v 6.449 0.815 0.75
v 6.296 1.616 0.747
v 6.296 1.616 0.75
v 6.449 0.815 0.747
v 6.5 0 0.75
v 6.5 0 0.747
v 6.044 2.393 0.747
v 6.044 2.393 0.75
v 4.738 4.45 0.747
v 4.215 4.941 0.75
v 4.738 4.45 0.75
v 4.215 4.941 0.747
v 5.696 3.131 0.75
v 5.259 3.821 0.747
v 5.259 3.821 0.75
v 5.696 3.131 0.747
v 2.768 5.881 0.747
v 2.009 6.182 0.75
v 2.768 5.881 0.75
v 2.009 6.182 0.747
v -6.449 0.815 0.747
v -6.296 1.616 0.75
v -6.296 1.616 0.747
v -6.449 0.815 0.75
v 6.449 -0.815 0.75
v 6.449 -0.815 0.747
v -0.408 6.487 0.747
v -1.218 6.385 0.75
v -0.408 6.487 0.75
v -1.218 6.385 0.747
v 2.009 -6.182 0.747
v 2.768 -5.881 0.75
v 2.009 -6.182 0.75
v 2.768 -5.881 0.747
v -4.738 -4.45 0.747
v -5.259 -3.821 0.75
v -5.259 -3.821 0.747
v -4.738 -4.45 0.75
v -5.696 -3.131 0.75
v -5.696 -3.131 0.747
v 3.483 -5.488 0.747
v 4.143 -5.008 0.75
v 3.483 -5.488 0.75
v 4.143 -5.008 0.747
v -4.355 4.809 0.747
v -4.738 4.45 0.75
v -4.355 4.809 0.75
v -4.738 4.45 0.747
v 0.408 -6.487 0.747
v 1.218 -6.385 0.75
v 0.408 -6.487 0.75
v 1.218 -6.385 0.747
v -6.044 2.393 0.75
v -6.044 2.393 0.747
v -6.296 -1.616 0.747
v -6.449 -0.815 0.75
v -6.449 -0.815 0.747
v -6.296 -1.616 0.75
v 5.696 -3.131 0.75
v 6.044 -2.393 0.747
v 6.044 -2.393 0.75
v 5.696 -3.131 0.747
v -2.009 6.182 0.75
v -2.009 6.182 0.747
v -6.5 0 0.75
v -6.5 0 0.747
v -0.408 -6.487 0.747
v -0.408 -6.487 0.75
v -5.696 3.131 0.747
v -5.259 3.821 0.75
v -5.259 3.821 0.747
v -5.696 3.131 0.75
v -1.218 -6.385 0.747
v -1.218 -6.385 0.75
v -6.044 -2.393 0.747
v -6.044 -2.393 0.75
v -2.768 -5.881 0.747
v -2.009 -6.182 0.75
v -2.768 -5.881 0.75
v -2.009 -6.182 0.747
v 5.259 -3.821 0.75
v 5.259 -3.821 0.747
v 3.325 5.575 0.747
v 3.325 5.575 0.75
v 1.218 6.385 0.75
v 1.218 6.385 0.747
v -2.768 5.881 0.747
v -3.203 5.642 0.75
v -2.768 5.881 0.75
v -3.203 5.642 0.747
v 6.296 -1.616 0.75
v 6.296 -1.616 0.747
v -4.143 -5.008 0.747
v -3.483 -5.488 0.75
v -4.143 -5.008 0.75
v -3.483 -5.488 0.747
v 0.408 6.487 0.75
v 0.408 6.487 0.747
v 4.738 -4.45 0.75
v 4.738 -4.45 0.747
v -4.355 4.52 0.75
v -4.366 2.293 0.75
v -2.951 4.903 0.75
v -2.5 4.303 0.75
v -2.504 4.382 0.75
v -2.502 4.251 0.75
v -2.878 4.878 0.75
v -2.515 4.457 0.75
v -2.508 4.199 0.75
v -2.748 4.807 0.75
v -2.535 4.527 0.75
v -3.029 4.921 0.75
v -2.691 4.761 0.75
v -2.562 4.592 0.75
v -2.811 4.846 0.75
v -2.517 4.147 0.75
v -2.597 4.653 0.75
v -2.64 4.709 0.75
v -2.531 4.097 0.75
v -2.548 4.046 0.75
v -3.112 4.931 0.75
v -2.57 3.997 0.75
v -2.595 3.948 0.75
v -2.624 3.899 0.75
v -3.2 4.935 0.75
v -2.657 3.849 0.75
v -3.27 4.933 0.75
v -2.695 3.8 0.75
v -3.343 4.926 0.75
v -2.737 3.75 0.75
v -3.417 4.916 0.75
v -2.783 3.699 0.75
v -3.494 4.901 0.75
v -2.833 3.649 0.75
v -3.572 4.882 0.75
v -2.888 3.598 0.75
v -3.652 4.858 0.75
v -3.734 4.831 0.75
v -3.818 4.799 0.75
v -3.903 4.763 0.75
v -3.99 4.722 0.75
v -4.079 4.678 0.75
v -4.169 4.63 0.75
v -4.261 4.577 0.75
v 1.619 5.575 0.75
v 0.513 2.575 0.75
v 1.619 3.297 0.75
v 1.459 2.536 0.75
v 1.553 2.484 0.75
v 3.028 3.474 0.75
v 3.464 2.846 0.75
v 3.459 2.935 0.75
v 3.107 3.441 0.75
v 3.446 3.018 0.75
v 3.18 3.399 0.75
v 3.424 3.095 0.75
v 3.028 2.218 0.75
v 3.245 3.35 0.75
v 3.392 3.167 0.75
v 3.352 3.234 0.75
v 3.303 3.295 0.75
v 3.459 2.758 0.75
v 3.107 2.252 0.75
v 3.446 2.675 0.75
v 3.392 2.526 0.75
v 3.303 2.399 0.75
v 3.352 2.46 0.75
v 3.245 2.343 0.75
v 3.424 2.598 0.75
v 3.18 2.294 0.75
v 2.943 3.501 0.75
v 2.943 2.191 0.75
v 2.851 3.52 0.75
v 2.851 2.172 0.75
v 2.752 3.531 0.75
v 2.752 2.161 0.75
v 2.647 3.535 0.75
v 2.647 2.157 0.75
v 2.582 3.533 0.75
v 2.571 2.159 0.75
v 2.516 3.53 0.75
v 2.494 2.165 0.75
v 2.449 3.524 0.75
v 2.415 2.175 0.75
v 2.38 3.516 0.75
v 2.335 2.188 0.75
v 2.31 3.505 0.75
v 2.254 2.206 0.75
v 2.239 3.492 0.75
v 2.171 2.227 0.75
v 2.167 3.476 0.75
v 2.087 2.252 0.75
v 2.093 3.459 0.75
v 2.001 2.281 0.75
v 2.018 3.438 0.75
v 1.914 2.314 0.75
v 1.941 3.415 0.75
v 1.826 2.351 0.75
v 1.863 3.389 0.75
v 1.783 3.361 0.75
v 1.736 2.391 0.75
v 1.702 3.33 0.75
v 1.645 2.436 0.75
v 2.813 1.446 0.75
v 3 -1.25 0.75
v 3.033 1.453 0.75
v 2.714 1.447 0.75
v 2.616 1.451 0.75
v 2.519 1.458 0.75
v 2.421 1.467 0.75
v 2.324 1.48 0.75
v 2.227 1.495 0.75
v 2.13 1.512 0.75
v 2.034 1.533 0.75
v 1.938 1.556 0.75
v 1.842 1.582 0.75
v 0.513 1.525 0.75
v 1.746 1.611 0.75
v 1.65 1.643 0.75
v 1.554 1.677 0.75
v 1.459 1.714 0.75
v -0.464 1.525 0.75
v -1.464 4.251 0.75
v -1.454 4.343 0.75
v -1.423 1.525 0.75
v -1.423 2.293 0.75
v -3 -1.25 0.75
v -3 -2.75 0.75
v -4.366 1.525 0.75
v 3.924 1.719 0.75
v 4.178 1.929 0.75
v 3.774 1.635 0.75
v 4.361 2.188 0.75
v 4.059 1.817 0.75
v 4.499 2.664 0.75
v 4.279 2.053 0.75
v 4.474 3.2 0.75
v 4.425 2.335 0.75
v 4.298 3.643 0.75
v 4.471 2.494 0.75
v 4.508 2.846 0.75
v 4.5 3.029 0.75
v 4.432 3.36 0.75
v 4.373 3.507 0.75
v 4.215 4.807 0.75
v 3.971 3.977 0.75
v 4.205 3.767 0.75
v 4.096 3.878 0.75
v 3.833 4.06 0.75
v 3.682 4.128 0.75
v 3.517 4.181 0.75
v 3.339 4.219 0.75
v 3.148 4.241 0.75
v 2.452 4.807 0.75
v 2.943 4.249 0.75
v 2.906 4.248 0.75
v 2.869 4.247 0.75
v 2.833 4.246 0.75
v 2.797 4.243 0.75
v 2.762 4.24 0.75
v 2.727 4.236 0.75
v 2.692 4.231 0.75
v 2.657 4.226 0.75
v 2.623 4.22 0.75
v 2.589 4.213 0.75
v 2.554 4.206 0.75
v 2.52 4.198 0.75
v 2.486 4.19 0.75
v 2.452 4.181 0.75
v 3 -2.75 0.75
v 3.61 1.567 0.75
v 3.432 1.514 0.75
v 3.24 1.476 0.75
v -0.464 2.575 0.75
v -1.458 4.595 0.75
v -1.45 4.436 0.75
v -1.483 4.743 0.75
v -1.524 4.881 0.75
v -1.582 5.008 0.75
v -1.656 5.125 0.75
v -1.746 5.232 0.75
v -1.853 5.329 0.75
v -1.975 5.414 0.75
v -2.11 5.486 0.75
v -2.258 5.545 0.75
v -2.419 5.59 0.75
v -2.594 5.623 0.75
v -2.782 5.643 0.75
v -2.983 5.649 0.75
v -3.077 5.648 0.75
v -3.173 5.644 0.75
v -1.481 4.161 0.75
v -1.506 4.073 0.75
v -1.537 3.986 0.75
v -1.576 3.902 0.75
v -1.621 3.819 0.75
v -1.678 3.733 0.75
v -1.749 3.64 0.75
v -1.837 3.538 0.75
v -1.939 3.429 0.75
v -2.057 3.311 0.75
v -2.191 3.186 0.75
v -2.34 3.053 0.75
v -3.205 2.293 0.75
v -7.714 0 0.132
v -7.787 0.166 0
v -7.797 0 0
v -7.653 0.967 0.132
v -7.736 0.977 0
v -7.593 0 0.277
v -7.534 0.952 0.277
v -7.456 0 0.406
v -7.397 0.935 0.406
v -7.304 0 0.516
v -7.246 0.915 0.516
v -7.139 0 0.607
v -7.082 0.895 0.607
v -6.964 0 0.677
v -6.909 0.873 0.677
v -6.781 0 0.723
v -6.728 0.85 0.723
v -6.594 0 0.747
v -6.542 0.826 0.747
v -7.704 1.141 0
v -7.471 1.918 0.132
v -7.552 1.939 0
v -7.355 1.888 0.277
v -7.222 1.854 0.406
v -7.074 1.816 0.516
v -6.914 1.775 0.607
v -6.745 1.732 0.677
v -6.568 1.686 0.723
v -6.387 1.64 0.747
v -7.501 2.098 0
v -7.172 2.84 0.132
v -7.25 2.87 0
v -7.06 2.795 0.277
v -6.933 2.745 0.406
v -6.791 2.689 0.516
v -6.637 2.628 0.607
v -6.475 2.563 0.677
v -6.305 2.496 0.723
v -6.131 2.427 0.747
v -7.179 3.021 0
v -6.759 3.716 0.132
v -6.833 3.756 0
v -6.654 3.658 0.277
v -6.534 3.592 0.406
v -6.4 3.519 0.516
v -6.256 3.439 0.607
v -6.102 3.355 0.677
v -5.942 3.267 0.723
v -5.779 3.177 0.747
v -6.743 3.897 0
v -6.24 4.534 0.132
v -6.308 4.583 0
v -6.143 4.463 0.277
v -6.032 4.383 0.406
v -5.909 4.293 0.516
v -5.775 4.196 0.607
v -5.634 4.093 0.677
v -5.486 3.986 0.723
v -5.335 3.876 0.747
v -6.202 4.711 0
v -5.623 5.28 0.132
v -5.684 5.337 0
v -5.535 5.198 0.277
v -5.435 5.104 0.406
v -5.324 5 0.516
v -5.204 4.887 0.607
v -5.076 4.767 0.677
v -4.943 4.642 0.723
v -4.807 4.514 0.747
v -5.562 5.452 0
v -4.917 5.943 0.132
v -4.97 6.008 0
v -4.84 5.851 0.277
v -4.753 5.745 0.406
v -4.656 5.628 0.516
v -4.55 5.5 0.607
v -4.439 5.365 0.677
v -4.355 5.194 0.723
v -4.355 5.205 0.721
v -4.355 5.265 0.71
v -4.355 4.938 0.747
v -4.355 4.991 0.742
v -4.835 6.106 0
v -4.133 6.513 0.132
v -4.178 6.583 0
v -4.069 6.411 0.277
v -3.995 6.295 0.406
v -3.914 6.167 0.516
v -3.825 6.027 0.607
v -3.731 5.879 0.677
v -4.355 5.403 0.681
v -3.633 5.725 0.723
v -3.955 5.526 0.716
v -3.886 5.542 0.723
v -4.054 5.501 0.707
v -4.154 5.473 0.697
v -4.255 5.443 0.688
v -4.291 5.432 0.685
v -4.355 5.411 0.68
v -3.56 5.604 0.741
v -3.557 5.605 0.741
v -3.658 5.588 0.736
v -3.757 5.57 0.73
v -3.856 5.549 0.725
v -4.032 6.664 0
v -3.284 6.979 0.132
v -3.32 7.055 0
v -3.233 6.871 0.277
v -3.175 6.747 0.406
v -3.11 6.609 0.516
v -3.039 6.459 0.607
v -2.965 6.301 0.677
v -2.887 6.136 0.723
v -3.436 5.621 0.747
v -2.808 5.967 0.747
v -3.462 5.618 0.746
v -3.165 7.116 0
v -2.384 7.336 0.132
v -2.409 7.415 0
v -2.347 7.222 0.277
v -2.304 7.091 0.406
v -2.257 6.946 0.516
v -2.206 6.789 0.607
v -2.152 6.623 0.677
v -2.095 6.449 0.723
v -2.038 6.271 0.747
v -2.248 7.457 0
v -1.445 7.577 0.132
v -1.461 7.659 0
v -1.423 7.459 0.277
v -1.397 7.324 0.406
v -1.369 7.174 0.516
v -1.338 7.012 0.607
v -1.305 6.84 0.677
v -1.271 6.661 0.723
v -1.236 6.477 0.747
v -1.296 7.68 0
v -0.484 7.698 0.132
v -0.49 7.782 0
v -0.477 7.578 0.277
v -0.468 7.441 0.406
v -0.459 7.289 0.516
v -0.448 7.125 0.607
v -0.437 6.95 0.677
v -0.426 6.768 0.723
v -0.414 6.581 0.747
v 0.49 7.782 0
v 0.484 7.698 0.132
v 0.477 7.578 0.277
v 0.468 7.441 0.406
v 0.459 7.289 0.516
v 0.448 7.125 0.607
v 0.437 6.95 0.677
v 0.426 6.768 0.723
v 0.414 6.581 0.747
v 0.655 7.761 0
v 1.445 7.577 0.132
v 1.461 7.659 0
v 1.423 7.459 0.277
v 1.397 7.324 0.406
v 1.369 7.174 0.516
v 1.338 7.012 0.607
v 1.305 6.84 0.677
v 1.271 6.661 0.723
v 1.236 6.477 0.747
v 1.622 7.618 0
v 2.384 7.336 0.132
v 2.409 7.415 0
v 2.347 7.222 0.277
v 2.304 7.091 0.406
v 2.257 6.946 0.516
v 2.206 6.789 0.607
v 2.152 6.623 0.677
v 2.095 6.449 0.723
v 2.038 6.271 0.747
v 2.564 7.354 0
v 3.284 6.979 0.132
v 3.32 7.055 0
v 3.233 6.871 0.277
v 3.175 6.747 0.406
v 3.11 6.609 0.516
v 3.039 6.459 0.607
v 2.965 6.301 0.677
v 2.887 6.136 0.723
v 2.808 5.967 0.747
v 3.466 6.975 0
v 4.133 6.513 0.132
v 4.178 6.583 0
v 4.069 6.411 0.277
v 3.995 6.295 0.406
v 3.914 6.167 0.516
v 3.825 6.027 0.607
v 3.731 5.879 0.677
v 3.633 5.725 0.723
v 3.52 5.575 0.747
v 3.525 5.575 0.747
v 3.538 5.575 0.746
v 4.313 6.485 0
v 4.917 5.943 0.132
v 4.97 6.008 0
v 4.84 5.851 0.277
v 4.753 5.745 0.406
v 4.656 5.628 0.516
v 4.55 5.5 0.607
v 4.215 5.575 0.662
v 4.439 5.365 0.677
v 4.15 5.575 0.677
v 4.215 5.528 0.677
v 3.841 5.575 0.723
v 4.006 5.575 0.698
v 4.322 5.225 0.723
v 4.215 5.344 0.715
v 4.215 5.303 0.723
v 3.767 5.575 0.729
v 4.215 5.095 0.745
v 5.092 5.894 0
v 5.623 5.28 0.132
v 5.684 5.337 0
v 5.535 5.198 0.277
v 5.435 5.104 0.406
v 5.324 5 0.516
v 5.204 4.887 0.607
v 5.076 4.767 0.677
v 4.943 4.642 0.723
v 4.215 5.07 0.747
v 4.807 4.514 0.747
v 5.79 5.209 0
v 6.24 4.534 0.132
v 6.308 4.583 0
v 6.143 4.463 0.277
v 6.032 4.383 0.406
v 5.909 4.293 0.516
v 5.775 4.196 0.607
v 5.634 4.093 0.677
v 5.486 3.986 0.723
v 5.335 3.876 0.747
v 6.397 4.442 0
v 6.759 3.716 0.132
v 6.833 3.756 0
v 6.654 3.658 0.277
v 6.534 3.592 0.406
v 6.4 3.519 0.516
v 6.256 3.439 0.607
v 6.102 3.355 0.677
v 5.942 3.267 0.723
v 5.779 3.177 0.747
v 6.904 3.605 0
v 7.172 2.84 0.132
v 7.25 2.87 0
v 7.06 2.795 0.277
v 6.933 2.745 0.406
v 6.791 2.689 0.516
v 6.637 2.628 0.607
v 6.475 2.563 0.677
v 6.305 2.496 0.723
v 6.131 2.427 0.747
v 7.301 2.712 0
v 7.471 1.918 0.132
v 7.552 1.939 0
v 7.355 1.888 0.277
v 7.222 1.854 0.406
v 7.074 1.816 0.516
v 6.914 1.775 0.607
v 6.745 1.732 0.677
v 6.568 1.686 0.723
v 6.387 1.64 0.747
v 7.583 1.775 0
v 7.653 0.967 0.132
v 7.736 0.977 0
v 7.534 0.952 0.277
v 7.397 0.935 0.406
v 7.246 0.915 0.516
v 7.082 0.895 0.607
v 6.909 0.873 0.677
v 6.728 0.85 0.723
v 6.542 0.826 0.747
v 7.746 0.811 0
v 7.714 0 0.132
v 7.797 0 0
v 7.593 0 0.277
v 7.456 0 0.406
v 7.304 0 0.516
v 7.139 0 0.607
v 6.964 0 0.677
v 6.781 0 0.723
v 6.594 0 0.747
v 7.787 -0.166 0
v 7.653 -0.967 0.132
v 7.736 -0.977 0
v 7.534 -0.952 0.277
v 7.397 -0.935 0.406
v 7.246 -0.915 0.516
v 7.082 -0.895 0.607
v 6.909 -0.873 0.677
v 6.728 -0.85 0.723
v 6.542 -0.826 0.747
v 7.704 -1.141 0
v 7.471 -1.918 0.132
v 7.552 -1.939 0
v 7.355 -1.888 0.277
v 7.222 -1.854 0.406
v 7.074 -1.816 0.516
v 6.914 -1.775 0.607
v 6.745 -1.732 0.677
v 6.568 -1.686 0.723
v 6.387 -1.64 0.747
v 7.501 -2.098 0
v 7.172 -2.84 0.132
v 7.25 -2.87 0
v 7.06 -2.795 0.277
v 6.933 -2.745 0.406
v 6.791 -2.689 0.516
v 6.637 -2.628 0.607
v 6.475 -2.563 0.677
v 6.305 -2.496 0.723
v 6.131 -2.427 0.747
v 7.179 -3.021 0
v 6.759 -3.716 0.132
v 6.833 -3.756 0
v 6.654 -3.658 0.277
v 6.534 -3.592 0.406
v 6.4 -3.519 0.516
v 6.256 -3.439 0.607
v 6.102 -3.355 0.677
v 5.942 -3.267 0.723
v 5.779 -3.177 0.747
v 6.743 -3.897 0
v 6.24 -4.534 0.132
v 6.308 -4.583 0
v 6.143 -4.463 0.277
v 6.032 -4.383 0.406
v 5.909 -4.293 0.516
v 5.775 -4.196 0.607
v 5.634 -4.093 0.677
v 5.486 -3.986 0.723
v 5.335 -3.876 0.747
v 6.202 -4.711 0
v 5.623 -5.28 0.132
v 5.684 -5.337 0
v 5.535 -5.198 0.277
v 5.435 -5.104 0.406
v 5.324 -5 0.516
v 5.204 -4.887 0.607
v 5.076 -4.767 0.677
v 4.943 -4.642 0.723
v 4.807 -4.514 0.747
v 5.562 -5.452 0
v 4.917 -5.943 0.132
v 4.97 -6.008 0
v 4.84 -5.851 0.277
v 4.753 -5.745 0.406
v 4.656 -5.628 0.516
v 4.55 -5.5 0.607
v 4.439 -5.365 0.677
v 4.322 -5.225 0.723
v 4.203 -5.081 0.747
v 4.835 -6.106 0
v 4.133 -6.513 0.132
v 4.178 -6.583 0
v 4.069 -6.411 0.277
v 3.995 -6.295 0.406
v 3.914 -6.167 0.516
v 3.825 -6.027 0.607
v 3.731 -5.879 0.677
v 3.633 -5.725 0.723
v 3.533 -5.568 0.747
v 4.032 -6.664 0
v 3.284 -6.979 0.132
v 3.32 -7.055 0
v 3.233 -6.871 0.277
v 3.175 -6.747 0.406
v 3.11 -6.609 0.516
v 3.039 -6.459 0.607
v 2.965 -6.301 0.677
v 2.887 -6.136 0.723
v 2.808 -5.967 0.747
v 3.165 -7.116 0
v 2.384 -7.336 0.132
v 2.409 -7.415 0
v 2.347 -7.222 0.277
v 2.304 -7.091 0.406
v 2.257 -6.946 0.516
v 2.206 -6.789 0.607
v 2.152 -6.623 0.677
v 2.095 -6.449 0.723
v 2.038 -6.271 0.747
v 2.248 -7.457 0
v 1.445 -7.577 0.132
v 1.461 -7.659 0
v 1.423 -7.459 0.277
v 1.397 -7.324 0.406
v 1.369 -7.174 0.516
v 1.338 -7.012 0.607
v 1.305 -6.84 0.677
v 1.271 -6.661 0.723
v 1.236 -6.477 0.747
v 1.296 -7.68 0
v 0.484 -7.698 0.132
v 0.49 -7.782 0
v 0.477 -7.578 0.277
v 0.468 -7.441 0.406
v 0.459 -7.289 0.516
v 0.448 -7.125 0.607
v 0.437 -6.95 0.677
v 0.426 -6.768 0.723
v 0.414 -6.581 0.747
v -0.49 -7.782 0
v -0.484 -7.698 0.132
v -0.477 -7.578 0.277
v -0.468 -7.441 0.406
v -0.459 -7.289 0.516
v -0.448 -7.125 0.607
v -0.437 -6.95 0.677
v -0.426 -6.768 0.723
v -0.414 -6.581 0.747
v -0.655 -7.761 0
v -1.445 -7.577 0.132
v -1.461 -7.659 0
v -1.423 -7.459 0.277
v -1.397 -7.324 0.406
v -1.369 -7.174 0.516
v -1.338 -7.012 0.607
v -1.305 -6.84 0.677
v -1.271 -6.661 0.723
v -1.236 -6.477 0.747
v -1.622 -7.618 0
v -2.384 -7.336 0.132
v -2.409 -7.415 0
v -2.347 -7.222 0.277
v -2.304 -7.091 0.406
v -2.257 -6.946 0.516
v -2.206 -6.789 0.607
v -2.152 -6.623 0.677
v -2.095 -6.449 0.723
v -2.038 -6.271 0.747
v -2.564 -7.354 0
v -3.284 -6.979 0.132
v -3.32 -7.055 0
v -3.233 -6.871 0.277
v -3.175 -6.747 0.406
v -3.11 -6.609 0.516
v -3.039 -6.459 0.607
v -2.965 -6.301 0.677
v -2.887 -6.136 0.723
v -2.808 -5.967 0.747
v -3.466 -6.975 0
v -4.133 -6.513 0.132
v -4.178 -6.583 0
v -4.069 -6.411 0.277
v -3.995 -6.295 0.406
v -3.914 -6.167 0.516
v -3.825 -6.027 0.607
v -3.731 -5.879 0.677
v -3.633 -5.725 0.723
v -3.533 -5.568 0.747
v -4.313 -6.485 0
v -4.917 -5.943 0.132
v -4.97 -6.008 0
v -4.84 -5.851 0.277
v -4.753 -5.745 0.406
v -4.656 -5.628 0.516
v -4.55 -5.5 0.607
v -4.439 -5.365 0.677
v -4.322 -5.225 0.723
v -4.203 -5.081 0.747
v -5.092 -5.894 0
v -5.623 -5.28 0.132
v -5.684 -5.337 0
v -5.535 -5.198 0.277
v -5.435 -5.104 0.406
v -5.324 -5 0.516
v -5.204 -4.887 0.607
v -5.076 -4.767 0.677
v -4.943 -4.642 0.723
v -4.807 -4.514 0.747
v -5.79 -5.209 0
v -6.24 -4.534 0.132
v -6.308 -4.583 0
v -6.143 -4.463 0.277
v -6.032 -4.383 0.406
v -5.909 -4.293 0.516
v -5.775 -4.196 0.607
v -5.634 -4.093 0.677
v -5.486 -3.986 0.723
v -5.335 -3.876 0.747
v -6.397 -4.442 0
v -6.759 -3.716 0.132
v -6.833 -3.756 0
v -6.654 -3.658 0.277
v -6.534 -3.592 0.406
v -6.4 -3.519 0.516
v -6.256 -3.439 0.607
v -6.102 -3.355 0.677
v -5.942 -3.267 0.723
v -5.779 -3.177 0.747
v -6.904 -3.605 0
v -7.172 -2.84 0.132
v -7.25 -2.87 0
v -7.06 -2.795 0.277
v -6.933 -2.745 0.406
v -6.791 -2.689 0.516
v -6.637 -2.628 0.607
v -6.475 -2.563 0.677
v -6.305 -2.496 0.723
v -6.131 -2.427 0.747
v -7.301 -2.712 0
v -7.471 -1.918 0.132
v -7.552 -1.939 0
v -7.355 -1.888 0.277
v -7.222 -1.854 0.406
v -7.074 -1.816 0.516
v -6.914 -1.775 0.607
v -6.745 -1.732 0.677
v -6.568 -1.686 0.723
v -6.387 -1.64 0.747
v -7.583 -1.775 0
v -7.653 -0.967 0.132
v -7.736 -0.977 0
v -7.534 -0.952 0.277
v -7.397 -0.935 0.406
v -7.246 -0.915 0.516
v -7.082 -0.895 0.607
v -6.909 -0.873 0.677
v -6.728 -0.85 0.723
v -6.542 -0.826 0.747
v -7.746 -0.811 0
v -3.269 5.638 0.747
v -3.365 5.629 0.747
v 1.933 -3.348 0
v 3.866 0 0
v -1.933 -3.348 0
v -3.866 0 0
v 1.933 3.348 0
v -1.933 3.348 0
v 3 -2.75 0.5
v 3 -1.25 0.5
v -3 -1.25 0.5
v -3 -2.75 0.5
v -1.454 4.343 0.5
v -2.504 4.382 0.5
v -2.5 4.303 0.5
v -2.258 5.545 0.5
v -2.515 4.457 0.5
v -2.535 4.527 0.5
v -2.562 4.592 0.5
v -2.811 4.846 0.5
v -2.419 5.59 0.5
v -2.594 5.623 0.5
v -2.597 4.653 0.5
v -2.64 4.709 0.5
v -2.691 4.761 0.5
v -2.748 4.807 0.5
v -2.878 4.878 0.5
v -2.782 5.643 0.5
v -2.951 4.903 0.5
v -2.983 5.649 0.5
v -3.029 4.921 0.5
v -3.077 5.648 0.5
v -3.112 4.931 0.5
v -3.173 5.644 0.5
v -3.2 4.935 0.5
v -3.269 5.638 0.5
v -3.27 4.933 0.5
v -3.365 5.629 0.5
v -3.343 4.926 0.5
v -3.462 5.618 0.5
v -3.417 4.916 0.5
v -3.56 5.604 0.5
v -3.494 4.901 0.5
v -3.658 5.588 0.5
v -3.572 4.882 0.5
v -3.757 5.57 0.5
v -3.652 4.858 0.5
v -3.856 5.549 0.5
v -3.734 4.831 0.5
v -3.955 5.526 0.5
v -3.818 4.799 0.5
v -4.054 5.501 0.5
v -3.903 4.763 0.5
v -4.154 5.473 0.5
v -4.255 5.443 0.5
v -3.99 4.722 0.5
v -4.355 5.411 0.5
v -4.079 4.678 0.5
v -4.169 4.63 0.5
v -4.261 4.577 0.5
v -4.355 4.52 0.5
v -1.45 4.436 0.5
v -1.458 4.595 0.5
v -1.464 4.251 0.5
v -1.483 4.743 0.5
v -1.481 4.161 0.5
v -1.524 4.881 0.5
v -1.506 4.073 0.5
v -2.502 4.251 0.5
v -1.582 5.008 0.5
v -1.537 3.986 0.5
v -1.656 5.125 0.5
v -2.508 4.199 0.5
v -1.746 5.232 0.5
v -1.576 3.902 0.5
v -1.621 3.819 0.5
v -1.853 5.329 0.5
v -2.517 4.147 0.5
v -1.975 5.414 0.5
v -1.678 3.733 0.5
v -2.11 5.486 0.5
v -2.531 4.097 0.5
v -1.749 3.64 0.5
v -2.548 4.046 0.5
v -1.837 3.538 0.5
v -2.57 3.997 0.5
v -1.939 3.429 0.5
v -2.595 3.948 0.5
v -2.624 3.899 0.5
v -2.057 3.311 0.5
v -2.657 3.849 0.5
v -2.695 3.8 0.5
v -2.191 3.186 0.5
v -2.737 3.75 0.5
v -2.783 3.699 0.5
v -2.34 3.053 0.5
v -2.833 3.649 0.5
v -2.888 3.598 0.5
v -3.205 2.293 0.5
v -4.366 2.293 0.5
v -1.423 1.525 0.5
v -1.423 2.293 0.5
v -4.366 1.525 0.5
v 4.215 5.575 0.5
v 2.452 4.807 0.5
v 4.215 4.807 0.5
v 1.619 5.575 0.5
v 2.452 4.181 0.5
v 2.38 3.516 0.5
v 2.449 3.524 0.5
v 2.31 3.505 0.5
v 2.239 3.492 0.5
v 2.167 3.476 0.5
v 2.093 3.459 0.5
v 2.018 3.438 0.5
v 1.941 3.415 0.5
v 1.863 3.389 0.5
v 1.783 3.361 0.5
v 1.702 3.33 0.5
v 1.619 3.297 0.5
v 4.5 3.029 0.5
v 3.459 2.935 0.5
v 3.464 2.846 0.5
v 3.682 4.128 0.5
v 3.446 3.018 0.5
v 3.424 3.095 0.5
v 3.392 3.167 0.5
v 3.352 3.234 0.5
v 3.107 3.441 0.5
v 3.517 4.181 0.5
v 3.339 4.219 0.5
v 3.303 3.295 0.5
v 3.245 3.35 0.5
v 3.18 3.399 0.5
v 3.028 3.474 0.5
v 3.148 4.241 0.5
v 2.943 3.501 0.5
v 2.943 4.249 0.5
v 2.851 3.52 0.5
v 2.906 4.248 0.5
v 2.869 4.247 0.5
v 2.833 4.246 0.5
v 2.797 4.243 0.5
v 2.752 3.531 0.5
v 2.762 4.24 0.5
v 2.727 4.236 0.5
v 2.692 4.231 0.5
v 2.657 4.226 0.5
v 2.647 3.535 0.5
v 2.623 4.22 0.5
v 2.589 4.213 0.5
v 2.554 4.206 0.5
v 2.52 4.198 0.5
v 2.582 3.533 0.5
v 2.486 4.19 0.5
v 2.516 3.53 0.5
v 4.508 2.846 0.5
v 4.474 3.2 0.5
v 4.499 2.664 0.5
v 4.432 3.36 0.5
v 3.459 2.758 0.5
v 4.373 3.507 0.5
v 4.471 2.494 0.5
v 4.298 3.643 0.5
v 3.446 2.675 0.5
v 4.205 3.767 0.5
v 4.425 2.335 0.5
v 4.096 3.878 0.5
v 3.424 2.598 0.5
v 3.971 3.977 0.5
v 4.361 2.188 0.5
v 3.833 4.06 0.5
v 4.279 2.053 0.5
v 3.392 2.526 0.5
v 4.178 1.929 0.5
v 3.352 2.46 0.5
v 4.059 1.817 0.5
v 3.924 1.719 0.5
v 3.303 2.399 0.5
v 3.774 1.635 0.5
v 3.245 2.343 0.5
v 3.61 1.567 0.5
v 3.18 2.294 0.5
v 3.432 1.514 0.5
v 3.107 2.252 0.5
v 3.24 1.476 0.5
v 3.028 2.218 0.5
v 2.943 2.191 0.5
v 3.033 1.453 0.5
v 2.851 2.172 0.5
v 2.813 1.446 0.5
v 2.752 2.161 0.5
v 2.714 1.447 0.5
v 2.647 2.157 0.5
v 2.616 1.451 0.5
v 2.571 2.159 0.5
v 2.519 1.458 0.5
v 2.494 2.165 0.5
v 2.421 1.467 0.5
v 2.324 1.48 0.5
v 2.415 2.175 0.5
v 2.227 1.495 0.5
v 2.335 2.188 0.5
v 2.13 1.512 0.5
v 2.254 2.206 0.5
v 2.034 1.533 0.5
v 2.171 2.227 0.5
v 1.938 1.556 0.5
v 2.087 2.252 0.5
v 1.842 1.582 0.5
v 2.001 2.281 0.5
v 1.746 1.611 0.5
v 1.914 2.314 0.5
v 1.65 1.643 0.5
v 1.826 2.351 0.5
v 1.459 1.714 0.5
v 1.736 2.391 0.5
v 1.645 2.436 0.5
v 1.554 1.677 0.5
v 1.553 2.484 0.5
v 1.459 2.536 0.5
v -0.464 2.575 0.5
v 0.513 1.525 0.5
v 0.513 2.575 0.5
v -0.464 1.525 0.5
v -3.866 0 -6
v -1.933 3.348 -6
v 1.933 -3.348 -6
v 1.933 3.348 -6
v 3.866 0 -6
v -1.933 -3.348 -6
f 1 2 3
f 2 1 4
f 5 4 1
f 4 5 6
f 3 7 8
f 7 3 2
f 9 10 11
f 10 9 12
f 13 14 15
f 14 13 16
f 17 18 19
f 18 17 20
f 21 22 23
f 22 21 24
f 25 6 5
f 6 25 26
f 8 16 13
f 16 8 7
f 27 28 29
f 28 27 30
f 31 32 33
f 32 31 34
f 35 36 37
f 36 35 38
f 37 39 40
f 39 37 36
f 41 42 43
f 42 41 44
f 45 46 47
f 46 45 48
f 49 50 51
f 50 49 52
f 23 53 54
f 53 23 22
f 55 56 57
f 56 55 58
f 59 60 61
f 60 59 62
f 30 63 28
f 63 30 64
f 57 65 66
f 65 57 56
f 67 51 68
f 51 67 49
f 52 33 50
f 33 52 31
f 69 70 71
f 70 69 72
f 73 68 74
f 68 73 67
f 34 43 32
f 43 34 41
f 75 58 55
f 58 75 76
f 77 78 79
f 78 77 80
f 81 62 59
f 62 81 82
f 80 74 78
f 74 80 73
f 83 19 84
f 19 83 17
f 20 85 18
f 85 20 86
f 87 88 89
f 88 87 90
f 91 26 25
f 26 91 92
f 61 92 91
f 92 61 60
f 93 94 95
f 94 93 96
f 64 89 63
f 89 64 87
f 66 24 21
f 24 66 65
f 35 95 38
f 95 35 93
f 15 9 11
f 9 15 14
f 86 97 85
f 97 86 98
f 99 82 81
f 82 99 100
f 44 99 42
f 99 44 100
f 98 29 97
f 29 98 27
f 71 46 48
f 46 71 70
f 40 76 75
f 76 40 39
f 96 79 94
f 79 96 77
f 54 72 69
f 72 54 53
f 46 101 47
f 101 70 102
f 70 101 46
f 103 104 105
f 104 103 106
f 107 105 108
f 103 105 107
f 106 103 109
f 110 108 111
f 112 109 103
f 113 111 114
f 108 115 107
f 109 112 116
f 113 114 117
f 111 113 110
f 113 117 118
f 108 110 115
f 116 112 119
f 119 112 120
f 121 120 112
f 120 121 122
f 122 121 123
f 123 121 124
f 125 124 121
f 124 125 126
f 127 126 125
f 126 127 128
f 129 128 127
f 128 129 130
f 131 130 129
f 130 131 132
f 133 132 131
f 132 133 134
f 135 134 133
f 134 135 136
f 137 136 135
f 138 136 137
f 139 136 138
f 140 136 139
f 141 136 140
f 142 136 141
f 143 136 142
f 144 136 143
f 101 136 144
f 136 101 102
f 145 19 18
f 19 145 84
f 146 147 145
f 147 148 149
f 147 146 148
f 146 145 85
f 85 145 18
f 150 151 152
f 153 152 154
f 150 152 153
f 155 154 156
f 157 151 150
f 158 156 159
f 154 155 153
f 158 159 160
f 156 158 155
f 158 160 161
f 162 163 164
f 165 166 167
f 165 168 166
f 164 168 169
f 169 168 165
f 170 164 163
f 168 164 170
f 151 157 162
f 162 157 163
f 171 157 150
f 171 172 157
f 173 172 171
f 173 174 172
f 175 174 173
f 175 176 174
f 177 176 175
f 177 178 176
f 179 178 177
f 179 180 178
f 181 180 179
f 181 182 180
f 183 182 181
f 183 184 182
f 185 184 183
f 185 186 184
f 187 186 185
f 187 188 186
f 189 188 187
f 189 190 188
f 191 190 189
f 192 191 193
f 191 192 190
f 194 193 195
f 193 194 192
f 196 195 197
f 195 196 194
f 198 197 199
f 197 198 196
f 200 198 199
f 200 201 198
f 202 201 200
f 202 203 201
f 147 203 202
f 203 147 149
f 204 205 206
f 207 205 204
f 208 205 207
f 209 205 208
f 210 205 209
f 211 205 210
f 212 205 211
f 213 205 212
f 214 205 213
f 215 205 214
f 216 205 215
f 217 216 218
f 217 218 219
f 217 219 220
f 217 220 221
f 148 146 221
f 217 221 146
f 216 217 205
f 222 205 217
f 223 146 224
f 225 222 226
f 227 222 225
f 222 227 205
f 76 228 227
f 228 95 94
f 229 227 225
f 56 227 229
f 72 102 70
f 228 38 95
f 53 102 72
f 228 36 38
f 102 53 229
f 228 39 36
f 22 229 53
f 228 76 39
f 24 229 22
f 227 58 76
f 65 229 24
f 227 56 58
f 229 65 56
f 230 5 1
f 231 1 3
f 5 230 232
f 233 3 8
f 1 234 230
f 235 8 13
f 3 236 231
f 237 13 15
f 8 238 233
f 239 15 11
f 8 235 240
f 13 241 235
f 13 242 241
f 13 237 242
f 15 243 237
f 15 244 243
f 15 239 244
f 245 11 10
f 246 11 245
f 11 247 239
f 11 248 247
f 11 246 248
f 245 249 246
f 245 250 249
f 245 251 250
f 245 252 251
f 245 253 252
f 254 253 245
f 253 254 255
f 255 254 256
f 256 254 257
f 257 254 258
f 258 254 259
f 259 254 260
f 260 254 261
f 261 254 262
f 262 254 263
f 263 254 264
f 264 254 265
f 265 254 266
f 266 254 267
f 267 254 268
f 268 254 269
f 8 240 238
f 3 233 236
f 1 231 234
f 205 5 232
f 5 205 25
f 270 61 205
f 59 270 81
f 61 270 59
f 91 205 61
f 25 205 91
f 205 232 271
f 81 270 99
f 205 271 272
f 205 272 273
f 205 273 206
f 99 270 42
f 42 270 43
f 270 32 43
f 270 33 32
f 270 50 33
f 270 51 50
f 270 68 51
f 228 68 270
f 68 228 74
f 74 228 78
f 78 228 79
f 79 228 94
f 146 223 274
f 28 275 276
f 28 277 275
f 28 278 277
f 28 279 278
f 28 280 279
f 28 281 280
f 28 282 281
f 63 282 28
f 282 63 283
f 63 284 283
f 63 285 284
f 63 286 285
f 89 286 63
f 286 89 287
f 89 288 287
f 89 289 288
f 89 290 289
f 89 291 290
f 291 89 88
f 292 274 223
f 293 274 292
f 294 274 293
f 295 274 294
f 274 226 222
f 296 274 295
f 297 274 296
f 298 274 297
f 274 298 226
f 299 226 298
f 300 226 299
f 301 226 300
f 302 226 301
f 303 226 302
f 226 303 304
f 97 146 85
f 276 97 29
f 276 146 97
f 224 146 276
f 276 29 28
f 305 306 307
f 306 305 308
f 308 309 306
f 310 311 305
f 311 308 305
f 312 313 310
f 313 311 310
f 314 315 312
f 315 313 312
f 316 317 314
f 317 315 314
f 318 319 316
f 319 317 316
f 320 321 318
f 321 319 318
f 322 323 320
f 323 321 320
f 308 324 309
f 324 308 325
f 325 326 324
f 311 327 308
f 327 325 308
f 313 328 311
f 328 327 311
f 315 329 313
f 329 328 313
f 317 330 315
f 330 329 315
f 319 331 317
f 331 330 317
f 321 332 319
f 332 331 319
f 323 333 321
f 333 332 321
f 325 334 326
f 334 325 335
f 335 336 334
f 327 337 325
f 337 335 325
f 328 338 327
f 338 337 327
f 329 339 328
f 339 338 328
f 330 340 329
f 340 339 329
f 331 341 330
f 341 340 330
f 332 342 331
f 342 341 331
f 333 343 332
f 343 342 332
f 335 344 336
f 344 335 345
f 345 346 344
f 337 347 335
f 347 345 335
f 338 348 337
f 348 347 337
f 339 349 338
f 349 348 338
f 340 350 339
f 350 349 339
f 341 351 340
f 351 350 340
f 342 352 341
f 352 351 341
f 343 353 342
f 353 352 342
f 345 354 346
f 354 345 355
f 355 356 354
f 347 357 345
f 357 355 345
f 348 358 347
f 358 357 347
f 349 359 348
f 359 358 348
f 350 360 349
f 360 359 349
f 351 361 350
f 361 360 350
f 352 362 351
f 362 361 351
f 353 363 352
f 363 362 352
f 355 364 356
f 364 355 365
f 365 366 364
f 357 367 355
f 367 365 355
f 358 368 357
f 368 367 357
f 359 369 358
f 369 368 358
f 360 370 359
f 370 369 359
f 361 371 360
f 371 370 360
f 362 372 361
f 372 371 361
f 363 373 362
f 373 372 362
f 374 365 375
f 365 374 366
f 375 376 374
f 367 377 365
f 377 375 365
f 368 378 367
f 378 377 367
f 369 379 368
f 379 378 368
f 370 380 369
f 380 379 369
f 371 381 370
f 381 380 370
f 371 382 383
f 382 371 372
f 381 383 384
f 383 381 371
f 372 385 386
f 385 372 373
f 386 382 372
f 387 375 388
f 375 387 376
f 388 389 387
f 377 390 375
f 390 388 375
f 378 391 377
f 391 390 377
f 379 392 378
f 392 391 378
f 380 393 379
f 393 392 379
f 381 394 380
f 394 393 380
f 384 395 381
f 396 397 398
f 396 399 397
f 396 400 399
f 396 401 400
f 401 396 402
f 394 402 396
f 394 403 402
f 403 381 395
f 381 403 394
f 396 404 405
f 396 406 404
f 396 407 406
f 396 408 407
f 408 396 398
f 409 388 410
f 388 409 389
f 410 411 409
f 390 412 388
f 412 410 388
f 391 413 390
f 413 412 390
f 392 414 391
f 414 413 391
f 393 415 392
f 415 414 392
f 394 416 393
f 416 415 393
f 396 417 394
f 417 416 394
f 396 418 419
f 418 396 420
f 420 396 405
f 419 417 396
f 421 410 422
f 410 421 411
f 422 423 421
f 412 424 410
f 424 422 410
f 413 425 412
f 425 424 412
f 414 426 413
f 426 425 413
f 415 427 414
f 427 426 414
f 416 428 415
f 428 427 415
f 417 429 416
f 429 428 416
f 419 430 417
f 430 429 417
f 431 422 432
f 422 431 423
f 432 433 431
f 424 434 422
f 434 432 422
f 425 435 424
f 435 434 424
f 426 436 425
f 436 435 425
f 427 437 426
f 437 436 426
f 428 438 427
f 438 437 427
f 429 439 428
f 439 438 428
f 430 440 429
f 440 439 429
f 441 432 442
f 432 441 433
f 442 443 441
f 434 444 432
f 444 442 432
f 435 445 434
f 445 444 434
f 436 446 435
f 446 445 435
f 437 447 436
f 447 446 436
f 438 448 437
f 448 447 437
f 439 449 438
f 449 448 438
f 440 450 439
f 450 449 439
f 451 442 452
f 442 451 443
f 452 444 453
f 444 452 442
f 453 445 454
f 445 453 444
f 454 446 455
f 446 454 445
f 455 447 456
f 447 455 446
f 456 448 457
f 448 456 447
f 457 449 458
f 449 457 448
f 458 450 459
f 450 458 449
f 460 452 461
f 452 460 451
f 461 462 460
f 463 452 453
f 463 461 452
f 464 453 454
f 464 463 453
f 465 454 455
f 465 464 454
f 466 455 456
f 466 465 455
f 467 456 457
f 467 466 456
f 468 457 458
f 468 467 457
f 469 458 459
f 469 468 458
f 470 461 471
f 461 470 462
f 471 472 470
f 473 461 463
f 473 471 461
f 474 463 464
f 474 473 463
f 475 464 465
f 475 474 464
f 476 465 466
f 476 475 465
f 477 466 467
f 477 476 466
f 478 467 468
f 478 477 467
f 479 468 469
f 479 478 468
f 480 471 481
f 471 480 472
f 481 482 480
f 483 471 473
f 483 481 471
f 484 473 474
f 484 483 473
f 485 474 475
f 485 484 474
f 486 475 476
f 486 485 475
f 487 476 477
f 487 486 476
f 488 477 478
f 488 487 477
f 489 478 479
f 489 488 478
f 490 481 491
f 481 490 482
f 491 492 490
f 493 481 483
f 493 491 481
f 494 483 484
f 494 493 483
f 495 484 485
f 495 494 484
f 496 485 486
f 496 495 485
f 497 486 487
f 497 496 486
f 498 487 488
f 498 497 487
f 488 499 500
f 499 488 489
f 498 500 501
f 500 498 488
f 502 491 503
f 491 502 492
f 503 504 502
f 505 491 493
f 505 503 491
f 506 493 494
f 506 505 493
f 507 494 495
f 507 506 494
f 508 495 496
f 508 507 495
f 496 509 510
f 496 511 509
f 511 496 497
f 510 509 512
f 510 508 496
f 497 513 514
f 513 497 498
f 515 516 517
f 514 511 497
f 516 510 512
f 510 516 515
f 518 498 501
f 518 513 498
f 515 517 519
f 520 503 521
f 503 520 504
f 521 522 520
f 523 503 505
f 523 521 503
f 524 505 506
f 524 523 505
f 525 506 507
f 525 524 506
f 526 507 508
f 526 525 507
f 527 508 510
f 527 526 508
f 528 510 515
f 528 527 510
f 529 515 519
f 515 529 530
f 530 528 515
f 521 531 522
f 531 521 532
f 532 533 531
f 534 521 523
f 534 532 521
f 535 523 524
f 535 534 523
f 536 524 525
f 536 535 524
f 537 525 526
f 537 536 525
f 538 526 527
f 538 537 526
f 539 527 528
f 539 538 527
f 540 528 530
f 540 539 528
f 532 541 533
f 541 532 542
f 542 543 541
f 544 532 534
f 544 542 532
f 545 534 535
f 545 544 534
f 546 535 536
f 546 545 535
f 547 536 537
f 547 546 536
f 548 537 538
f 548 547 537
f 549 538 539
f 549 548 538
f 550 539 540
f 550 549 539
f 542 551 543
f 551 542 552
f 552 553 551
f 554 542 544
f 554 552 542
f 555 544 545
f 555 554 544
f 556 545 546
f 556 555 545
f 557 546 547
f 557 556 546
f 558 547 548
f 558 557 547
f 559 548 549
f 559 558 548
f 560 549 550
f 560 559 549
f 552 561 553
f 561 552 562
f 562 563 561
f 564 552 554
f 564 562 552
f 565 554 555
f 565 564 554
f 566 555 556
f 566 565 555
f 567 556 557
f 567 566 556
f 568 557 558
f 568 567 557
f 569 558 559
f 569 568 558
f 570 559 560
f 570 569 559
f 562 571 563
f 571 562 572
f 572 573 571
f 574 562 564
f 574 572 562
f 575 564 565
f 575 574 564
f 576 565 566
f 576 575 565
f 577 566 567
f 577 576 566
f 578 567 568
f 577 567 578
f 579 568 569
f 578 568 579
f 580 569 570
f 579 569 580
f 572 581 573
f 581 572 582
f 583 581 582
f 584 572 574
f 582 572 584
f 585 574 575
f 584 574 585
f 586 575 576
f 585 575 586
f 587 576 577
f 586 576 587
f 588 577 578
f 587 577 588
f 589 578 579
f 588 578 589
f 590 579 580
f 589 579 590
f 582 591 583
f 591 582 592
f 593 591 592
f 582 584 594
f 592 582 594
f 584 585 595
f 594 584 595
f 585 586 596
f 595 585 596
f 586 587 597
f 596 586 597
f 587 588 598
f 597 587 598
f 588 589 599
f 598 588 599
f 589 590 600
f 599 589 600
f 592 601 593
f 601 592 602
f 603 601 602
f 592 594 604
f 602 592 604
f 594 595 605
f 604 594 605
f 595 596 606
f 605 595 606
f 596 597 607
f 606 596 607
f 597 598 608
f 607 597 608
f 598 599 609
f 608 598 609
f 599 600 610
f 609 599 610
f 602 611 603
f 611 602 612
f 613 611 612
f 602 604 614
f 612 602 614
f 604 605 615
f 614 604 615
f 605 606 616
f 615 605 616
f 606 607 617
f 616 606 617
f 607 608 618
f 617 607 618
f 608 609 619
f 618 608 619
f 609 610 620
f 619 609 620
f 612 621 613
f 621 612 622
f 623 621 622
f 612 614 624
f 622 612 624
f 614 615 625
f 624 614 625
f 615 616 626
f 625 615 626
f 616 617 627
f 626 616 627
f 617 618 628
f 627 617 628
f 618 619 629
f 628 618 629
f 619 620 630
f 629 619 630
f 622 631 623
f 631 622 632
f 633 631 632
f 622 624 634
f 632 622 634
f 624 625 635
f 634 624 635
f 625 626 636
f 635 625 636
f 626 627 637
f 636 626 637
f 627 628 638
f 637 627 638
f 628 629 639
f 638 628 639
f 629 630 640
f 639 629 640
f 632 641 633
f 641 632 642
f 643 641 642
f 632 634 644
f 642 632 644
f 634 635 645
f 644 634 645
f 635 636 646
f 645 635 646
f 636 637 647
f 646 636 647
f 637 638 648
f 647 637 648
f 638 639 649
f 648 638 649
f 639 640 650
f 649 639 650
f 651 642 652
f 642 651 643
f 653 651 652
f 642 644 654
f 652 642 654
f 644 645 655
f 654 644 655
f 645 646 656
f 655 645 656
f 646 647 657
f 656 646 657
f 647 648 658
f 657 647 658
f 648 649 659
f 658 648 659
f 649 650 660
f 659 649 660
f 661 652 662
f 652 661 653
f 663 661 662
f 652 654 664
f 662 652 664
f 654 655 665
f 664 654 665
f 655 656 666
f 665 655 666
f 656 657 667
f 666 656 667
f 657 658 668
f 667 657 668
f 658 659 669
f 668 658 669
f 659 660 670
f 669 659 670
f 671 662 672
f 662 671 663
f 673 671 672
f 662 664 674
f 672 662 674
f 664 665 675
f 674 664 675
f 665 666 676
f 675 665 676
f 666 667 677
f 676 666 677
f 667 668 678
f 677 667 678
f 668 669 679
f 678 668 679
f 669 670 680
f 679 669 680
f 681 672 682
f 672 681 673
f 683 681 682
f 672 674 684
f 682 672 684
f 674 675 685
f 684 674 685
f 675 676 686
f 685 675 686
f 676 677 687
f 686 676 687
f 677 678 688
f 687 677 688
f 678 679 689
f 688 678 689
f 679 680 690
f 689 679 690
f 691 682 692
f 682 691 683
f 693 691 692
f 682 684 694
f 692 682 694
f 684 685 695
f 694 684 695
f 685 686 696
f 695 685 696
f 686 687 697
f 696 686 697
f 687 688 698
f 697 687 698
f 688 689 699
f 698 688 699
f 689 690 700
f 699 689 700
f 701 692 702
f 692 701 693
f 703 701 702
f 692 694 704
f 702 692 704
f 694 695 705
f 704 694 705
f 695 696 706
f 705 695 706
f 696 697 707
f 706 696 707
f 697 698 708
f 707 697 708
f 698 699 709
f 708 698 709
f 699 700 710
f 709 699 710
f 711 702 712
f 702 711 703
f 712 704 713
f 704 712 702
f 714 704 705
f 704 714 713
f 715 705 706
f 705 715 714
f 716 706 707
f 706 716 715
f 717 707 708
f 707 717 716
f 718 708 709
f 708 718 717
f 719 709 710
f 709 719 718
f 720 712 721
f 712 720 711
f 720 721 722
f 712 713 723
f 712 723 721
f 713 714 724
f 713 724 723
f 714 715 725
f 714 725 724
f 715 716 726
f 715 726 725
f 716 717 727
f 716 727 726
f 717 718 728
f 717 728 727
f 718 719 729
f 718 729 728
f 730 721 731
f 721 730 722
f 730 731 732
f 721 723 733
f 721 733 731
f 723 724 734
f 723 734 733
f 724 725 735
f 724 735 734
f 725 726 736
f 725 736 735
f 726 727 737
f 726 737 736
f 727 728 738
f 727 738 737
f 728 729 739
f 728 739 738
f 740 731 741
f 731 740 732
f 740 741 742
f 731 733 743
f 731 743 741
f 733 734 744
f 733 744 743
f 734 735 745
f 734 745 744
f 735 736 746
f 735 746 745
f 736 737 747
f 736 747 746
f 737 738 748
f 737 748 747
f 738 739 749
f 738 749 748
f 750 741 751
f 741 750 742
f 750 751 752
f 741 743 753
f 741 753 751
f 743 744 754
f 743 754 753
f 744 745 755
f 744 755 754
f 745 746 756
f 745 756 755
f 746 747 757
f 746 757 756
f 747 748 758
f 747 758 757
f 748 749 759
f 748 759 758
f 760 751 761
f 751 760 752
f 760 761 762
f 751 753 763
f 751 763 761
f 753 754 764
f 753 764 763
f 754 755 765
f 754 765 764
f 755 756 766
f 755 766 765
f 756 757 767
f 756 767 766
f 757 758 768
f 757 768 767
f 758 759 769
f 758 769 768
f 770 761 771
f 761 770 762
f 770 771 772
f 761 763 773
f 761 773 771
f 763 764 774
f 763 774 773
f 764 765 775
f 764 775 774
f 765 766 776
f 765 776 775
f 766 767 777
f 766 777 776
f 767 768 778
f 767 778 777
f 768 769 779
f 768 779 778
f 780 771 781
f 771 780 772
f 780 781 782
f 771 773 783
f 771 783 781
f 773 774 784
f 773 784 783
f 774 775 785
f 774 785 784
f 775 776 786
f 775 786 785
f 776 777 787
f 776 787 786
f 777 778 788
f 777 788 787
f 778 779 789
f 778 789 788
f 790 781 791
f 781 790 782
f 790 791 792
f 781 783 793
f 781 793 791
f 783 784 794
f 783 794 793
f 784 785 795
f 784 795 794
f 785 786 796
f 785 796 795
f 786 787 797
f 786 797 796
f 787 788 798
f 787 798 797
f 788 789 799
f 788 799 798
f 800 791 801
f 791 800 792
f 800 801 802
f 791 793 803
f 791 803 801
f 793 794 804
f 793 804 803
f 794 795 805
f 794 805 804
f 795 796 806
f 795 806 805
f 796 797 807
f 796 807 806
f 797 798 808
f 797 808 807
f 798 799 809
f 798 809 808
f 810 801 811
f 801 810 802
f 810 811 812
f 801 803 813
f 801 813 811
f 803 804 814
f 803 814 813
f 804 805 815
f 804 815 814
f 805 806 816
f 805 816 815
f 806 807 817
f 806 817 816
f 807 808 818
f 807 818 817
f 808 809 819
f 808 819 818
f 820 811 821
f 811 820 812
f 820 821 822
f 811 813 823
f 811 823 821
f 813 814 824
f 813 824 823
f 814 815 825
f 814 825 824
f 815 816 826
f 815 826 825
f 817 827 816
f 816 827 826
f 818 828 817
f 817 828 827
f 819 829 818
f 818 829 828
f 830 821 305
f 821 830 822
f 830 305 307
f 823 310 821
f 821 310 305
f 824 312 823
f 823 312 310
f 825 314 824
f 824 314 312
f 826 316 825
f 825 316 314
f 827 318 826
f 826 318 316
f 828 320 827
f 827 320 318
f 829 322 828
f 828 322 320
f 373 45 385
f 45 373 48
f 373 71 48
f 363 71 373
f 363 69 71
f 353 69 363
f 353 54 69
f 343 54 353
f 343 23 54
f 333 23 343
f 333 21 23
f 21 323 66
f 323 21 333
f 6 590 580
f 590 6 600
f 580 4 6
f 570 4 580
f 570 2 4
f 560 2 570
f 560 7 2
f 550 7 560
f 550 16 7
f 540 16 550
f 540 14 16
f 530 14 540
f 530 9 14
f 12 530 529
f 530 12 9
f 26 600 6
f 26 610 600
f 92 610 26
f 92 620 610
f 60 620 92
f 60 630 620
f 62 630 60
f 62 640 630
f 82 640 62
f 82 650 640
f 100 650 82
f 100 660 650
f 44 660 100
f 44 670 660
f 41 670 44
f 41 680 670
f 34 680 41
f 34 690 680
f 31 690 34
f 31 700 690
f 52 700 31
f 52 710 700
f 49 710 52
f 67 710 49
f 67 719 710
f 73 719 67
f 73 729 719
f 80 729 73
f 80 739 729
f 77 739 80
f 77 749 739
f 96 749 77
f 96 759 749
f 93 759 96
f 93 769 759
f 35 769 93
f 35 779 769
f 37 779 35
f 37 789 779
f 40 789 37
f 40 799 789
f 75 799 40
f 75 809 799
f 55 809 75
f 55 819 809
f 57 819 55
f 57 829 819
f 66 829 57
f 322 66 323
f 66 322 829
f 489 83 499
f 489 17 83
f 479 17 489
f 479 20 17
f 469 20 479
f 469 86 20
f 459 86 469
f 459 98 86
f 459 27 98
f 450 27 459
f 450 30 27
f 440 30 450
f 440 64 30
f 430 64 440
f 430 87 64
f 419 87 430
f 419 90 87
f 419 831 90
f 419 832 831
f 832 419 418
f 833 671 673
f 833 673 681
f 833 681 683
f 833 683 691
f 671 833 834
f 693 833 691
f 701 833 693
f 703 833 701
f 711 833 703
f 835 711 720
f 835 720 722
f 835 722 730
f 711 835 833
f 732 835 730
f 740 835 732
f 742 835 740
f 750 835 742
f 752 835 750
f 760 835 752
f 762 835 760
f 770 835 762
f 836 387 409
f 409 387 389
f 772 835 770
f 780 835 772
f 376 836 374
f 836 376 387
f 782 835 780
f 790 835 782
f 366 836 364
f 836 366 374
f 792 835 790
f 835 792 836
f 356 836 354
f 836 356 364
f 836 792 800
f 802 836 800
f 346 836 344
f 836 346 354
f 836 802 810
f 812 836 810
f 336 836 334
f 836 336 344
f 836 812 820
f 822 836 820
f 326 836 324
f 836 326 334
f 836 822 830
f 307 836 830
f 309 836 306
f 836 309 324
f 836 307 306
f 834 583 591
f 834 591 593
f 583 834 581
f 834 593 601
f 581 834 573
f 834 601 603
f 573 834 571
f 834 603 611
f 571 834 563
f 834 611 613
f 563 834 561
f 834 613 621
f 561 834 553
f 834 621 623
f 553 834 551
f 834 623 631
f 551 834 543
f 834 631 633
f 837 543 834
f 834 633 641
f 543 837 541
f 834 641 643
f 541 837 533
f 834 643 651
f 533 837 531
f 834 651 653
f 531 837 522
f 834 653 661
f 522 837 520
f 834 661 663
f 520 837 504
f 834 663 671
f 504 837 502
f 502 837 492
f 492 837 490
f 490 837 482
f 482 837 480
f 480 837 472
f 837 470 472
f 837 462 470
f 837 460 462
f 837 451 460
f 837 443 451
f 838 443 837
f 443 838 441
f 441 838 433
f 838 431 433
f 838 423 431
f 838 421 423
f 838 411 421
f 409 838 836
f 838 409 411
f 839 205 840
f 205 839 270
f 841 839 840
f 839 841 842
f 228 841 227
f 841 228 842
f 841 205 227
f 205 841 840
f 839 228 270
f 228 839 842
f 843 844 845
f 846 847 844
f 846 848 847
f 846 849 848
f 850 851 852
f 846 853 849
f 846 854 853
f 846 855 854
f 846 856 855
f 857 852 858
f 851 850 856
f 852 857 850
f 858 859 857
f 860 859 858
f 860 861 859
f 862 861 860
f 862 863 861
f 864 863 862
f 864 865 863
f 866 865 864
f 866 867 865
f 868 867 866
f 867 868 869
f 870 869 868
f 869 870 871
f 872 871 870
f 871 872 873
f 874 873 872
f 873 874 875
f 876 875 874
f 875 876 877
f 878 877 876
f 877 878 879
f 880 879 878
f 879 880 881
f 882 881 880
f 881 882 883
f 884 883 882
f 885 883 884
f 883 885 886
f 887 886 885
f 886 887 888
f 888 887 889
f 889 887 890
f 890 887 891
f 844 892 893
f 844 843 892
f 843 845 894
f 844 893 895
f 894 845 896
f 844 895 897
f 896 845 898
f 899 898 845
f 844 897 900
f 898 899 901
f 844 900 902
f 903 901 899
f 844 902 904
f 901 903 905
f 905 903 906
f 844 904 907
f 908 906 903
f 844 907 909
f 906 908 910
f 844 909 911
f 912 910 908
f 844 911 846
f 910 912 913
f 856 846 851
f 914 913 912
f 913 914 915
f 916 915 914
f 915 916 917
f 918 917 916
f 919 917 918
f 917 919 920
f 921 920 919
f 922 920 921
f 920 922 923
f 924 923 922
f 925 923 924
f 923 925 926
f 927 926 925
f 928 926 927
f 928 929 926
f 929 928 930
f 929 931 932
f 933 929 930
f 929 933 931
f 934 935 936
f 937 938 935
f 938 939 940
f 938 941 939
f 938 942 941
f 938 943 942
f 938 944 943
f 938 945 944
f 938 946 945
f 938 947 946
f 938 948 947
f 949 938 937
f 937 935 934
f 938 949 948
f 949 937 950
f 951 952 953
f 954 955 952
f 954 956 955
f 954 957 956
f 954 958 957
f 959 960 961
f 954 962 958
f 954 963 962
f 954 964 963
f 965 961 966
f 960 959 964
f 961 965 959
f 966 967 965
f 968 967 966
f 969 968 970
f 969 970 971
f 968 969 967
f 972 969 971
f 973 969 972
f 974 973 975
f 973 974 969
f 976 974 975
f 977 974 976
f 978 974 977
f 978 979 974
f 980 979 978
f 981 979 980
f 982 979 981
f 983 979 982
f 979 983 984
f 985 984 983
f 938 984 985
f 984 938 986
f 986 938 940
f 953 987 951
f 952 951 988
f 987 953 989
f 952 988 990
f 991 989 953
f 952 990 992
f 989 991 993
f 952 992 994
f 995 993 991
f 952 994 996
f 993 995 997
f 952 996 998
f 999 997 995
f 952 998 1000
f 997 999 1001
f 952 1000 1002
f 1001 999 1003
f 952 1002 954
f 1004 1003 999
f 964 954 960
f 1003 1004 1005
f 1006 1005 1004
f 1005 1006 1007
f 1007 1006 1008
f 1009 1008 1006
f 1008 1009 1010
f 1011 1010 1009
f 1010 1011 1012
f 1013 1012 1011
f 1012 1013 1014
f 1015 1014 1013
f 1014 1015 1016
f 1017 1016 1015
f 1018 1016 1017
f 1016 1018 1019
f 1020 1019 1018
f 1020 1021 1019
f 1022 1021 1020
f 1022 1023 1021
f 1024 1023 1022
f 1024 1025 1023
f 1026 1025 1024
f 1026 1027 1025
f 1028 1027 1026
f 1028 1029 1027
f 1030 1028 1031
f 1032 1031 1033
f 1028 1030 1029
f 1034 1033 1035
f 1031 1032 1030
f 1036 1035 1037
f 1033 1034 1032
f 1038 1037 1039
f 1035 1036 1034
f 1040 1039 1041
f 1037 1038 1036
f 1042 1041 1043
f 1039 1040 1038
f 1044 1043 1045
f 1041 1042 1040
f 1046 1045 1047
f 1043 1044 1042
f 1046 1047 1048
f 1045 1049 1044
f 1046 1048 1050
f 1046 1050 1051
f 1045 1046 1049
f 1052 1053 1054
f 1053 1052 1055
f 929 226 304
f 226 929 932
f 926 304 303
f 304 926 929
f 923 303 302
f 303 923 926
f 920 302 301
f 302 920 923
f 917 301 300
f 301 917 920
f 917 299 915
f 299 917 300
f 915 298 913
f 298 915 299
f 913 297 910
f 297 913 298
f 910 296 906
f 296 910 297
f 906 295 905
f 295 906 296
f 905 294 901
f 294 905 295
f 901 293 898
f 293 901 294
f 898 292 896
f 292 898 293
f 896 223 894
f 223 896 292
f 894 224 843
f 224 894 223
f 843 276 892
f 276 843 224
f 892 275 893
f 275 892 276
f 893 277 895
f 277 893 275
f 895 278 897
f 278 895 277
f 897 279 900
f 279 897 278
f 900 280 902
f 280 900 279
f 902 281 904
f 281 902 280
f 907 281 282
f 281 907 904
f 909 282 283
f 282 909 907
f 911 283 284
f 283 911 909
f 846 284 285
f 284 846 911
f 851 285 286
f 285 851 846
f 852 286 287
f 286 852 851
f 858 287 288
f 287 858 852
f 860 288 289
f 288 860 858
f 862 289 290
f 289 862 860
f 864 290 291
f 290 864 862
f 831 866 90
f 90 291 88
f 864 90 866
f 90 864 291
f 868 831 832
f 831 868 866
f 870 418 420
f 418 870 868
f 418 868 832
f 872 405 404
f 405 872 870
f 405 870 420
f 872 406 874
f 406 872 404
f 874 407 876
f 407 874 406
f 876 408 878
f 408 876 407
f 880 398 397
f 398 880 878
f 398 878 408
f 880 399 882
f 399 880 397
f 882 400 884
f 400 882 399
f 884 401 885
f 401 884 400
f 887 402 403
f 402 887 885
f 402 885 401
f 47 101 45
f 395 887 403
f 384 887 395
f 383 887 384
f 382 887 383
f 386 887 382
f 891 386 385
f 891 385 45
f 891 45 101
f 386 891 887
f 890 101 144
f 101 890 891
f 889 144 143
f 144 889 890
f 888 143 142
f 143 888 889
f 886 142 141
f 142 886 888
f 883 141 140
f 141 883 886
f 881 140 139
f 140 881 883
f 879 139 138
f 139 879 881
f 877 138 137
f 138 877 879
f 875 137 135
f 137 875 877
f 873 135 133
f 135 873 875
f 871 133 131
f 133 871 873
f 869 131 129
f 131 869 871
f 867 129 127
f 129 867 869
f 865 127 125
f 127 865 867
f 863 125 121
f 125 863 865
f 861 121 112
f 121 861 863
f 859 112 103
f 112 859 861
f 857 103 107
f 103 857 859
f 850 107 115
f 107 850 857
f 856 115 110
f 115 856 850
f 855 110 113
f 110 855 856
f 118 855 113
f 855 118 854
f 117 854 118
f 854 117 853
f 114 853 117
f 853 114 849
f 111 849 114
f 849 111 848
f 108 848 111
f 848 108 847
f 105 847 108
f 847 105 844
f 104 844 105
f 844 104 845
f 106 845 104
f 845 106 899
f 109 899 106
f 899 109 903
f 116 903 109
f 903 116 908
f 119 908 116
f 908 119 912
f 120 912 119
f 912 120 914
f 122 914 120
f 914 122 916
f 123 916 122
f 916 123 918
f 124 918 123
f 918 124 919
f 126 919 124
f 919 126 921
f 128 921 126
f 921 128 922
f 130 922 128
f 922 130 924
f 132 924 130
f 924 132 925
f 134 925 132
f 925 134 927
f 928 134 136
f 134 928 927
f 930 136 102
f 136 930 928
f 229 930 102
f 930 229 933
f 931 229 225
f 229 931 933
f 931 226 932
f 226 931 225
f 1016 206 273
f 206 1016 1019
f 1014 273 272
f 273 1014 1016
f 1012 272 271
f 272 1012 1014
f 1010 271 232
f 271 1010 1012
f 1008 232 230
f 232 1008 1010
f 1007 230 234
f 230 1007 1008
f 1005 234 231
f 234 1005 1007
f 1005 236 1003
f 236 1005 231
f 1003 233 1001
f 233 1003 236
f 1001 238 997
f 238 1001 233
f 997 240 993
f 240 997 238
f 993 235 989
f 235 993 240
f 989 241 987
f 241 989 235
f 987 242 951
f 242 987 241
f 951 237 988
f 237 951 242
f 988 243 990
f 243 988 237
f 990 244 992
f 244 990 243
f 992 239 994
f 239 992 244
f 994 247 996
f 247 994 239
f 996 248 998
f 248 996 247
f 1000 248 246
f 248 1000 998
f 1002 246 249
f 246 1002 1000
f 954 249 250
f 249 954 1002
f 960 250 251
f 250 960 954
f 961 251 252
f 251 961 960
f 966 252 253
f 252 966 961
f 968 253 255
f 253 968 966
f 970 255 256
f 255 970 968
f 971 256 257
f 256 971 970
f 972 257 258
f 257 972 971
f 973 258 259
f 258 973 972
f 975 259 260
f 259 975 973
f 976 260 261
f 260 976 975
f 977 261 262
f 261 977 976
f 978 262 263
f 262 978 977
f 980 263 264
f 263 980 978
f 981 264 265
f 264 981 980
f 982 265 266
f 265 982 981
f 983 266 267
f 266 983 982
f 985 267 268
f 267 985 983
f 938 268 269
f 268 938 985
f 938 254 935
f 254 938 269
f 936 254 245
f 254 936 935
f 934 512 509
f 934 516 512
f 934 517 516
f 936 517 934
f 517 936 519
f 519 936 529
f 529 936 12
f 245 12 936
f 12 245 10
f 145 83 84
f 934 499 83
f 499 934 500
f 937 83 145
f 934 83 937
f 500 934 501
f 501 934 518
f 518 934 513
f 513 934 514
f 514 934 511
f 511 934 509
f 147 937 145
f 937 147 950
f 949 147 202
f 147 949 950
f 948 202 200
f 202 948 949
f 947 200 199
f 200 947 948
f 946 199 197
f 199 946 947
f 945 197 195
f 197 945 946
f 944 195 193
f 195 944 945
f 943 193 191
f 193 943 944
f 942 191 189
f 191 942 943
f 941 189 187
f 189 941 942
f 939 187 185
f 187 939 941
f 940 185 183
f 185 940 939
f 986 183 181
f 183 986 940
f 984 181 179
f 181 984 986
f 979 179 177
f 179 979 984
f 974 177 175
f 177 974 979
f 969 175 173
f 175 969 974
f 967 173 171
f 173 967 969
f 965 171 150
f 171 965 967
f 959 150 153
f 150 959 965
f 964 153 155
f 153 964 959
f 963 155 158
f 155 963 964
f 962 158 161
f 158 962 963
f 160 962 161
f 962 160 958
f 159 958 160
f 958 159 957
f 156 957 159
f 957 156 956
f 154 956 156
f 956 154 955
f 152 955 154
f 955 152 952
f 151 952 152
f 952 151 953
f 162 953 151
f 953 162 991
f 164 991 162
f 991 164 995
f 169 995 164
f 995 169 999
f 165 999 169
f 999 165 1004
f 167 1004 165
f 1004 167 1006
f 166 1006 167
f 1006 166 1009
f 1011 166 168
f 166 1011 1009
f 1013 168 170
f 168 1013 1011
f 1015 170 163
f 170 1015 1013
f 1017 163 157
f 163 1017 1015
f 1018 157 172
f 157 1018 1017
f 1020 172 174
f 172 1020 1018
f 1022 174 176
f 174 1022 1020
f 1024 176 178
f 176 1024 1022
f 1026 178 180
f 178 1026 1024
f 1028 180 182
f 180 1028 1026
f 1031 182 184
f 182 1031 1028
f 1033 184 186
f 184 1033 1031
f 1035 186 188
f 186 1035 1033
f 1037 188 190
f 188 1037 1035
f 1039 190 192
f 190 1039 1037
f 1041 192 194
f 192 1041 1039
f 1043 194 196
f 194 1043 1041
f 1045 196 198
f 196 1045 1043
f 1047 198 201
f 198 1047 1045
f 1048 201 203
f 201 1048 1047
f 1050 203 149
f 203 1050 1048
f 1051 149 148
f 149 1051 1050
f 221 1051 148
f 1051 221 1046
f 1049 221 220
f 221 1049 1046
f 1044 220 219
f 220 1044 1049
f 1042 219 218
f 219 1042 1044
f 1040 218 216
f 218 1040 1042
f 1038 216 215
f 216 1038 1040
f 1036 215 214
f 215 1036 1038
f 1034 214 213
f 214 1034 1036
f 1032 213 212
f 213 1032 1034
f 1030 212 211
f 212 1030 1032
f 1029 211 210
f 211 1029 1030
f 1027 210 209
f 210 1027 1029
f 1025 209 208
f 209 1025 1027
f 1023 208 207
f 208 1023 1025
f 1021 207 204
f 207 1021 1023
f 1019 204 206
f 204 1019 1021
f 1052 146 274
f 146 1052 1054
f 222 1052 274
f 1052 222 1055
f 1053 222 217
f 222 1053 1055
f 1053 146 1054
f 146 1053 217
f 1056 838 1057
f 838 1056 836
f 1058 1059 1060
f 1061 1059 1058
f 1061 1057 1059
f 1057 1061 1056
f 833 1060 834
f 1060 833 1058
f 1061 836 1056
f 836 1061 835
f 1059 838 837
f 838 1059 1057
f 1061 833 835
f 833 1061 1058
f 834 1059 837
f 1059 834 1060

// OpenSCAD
$fn = 50;


union() {
	difference() {
		union() {
			translate(v = [0, 0, -0.7500000000]) {
				cylinder(h = 1.5000000000, r = 6.5000000000);
			}
			translate(v = [0, 0, -0.7500000000]) {
				rotate_extrude(angle = 360) {
					translate(v = [6.5000000000, 0, 0]) {
						circle(r = 1.5000000000);
					}
				}
			}
		}
		union() {
			translate(v = [-25.0000000000, -25.0000000000, -50]) {
				cube(size = [50, 50, 50]);
			}
			#translate(v = [-3.0000000000, -2.7500000000, 0.5000000000]) {
				cube(size = [6, 1.5000000000, 0.2500000000]);
			}
			#translate(v = [0, 3.5000000000, 0.5000000000]) {
				linear_extrude(height = 0.2500000000) {
					text(font = "SegoiUI:Bold", halign = "center", size = 4, text = "2.5", valign = "center");
				}
			}
		}
	}
	union() {
		translate(v = [0, 0, -6]) {
			linear_extrude(height = 6) {
				polygon(points = [[3.8658550000, 0.0000000000], [1.9329275000, 3.3479286373], [-1.9329275000, 3.3479286373], [-3.8658550000, 0.0000000000], [-1.9329275000, -3.3479286373], [1.9329275000, -3.3479286373]]);
			}
		}
	}
}
